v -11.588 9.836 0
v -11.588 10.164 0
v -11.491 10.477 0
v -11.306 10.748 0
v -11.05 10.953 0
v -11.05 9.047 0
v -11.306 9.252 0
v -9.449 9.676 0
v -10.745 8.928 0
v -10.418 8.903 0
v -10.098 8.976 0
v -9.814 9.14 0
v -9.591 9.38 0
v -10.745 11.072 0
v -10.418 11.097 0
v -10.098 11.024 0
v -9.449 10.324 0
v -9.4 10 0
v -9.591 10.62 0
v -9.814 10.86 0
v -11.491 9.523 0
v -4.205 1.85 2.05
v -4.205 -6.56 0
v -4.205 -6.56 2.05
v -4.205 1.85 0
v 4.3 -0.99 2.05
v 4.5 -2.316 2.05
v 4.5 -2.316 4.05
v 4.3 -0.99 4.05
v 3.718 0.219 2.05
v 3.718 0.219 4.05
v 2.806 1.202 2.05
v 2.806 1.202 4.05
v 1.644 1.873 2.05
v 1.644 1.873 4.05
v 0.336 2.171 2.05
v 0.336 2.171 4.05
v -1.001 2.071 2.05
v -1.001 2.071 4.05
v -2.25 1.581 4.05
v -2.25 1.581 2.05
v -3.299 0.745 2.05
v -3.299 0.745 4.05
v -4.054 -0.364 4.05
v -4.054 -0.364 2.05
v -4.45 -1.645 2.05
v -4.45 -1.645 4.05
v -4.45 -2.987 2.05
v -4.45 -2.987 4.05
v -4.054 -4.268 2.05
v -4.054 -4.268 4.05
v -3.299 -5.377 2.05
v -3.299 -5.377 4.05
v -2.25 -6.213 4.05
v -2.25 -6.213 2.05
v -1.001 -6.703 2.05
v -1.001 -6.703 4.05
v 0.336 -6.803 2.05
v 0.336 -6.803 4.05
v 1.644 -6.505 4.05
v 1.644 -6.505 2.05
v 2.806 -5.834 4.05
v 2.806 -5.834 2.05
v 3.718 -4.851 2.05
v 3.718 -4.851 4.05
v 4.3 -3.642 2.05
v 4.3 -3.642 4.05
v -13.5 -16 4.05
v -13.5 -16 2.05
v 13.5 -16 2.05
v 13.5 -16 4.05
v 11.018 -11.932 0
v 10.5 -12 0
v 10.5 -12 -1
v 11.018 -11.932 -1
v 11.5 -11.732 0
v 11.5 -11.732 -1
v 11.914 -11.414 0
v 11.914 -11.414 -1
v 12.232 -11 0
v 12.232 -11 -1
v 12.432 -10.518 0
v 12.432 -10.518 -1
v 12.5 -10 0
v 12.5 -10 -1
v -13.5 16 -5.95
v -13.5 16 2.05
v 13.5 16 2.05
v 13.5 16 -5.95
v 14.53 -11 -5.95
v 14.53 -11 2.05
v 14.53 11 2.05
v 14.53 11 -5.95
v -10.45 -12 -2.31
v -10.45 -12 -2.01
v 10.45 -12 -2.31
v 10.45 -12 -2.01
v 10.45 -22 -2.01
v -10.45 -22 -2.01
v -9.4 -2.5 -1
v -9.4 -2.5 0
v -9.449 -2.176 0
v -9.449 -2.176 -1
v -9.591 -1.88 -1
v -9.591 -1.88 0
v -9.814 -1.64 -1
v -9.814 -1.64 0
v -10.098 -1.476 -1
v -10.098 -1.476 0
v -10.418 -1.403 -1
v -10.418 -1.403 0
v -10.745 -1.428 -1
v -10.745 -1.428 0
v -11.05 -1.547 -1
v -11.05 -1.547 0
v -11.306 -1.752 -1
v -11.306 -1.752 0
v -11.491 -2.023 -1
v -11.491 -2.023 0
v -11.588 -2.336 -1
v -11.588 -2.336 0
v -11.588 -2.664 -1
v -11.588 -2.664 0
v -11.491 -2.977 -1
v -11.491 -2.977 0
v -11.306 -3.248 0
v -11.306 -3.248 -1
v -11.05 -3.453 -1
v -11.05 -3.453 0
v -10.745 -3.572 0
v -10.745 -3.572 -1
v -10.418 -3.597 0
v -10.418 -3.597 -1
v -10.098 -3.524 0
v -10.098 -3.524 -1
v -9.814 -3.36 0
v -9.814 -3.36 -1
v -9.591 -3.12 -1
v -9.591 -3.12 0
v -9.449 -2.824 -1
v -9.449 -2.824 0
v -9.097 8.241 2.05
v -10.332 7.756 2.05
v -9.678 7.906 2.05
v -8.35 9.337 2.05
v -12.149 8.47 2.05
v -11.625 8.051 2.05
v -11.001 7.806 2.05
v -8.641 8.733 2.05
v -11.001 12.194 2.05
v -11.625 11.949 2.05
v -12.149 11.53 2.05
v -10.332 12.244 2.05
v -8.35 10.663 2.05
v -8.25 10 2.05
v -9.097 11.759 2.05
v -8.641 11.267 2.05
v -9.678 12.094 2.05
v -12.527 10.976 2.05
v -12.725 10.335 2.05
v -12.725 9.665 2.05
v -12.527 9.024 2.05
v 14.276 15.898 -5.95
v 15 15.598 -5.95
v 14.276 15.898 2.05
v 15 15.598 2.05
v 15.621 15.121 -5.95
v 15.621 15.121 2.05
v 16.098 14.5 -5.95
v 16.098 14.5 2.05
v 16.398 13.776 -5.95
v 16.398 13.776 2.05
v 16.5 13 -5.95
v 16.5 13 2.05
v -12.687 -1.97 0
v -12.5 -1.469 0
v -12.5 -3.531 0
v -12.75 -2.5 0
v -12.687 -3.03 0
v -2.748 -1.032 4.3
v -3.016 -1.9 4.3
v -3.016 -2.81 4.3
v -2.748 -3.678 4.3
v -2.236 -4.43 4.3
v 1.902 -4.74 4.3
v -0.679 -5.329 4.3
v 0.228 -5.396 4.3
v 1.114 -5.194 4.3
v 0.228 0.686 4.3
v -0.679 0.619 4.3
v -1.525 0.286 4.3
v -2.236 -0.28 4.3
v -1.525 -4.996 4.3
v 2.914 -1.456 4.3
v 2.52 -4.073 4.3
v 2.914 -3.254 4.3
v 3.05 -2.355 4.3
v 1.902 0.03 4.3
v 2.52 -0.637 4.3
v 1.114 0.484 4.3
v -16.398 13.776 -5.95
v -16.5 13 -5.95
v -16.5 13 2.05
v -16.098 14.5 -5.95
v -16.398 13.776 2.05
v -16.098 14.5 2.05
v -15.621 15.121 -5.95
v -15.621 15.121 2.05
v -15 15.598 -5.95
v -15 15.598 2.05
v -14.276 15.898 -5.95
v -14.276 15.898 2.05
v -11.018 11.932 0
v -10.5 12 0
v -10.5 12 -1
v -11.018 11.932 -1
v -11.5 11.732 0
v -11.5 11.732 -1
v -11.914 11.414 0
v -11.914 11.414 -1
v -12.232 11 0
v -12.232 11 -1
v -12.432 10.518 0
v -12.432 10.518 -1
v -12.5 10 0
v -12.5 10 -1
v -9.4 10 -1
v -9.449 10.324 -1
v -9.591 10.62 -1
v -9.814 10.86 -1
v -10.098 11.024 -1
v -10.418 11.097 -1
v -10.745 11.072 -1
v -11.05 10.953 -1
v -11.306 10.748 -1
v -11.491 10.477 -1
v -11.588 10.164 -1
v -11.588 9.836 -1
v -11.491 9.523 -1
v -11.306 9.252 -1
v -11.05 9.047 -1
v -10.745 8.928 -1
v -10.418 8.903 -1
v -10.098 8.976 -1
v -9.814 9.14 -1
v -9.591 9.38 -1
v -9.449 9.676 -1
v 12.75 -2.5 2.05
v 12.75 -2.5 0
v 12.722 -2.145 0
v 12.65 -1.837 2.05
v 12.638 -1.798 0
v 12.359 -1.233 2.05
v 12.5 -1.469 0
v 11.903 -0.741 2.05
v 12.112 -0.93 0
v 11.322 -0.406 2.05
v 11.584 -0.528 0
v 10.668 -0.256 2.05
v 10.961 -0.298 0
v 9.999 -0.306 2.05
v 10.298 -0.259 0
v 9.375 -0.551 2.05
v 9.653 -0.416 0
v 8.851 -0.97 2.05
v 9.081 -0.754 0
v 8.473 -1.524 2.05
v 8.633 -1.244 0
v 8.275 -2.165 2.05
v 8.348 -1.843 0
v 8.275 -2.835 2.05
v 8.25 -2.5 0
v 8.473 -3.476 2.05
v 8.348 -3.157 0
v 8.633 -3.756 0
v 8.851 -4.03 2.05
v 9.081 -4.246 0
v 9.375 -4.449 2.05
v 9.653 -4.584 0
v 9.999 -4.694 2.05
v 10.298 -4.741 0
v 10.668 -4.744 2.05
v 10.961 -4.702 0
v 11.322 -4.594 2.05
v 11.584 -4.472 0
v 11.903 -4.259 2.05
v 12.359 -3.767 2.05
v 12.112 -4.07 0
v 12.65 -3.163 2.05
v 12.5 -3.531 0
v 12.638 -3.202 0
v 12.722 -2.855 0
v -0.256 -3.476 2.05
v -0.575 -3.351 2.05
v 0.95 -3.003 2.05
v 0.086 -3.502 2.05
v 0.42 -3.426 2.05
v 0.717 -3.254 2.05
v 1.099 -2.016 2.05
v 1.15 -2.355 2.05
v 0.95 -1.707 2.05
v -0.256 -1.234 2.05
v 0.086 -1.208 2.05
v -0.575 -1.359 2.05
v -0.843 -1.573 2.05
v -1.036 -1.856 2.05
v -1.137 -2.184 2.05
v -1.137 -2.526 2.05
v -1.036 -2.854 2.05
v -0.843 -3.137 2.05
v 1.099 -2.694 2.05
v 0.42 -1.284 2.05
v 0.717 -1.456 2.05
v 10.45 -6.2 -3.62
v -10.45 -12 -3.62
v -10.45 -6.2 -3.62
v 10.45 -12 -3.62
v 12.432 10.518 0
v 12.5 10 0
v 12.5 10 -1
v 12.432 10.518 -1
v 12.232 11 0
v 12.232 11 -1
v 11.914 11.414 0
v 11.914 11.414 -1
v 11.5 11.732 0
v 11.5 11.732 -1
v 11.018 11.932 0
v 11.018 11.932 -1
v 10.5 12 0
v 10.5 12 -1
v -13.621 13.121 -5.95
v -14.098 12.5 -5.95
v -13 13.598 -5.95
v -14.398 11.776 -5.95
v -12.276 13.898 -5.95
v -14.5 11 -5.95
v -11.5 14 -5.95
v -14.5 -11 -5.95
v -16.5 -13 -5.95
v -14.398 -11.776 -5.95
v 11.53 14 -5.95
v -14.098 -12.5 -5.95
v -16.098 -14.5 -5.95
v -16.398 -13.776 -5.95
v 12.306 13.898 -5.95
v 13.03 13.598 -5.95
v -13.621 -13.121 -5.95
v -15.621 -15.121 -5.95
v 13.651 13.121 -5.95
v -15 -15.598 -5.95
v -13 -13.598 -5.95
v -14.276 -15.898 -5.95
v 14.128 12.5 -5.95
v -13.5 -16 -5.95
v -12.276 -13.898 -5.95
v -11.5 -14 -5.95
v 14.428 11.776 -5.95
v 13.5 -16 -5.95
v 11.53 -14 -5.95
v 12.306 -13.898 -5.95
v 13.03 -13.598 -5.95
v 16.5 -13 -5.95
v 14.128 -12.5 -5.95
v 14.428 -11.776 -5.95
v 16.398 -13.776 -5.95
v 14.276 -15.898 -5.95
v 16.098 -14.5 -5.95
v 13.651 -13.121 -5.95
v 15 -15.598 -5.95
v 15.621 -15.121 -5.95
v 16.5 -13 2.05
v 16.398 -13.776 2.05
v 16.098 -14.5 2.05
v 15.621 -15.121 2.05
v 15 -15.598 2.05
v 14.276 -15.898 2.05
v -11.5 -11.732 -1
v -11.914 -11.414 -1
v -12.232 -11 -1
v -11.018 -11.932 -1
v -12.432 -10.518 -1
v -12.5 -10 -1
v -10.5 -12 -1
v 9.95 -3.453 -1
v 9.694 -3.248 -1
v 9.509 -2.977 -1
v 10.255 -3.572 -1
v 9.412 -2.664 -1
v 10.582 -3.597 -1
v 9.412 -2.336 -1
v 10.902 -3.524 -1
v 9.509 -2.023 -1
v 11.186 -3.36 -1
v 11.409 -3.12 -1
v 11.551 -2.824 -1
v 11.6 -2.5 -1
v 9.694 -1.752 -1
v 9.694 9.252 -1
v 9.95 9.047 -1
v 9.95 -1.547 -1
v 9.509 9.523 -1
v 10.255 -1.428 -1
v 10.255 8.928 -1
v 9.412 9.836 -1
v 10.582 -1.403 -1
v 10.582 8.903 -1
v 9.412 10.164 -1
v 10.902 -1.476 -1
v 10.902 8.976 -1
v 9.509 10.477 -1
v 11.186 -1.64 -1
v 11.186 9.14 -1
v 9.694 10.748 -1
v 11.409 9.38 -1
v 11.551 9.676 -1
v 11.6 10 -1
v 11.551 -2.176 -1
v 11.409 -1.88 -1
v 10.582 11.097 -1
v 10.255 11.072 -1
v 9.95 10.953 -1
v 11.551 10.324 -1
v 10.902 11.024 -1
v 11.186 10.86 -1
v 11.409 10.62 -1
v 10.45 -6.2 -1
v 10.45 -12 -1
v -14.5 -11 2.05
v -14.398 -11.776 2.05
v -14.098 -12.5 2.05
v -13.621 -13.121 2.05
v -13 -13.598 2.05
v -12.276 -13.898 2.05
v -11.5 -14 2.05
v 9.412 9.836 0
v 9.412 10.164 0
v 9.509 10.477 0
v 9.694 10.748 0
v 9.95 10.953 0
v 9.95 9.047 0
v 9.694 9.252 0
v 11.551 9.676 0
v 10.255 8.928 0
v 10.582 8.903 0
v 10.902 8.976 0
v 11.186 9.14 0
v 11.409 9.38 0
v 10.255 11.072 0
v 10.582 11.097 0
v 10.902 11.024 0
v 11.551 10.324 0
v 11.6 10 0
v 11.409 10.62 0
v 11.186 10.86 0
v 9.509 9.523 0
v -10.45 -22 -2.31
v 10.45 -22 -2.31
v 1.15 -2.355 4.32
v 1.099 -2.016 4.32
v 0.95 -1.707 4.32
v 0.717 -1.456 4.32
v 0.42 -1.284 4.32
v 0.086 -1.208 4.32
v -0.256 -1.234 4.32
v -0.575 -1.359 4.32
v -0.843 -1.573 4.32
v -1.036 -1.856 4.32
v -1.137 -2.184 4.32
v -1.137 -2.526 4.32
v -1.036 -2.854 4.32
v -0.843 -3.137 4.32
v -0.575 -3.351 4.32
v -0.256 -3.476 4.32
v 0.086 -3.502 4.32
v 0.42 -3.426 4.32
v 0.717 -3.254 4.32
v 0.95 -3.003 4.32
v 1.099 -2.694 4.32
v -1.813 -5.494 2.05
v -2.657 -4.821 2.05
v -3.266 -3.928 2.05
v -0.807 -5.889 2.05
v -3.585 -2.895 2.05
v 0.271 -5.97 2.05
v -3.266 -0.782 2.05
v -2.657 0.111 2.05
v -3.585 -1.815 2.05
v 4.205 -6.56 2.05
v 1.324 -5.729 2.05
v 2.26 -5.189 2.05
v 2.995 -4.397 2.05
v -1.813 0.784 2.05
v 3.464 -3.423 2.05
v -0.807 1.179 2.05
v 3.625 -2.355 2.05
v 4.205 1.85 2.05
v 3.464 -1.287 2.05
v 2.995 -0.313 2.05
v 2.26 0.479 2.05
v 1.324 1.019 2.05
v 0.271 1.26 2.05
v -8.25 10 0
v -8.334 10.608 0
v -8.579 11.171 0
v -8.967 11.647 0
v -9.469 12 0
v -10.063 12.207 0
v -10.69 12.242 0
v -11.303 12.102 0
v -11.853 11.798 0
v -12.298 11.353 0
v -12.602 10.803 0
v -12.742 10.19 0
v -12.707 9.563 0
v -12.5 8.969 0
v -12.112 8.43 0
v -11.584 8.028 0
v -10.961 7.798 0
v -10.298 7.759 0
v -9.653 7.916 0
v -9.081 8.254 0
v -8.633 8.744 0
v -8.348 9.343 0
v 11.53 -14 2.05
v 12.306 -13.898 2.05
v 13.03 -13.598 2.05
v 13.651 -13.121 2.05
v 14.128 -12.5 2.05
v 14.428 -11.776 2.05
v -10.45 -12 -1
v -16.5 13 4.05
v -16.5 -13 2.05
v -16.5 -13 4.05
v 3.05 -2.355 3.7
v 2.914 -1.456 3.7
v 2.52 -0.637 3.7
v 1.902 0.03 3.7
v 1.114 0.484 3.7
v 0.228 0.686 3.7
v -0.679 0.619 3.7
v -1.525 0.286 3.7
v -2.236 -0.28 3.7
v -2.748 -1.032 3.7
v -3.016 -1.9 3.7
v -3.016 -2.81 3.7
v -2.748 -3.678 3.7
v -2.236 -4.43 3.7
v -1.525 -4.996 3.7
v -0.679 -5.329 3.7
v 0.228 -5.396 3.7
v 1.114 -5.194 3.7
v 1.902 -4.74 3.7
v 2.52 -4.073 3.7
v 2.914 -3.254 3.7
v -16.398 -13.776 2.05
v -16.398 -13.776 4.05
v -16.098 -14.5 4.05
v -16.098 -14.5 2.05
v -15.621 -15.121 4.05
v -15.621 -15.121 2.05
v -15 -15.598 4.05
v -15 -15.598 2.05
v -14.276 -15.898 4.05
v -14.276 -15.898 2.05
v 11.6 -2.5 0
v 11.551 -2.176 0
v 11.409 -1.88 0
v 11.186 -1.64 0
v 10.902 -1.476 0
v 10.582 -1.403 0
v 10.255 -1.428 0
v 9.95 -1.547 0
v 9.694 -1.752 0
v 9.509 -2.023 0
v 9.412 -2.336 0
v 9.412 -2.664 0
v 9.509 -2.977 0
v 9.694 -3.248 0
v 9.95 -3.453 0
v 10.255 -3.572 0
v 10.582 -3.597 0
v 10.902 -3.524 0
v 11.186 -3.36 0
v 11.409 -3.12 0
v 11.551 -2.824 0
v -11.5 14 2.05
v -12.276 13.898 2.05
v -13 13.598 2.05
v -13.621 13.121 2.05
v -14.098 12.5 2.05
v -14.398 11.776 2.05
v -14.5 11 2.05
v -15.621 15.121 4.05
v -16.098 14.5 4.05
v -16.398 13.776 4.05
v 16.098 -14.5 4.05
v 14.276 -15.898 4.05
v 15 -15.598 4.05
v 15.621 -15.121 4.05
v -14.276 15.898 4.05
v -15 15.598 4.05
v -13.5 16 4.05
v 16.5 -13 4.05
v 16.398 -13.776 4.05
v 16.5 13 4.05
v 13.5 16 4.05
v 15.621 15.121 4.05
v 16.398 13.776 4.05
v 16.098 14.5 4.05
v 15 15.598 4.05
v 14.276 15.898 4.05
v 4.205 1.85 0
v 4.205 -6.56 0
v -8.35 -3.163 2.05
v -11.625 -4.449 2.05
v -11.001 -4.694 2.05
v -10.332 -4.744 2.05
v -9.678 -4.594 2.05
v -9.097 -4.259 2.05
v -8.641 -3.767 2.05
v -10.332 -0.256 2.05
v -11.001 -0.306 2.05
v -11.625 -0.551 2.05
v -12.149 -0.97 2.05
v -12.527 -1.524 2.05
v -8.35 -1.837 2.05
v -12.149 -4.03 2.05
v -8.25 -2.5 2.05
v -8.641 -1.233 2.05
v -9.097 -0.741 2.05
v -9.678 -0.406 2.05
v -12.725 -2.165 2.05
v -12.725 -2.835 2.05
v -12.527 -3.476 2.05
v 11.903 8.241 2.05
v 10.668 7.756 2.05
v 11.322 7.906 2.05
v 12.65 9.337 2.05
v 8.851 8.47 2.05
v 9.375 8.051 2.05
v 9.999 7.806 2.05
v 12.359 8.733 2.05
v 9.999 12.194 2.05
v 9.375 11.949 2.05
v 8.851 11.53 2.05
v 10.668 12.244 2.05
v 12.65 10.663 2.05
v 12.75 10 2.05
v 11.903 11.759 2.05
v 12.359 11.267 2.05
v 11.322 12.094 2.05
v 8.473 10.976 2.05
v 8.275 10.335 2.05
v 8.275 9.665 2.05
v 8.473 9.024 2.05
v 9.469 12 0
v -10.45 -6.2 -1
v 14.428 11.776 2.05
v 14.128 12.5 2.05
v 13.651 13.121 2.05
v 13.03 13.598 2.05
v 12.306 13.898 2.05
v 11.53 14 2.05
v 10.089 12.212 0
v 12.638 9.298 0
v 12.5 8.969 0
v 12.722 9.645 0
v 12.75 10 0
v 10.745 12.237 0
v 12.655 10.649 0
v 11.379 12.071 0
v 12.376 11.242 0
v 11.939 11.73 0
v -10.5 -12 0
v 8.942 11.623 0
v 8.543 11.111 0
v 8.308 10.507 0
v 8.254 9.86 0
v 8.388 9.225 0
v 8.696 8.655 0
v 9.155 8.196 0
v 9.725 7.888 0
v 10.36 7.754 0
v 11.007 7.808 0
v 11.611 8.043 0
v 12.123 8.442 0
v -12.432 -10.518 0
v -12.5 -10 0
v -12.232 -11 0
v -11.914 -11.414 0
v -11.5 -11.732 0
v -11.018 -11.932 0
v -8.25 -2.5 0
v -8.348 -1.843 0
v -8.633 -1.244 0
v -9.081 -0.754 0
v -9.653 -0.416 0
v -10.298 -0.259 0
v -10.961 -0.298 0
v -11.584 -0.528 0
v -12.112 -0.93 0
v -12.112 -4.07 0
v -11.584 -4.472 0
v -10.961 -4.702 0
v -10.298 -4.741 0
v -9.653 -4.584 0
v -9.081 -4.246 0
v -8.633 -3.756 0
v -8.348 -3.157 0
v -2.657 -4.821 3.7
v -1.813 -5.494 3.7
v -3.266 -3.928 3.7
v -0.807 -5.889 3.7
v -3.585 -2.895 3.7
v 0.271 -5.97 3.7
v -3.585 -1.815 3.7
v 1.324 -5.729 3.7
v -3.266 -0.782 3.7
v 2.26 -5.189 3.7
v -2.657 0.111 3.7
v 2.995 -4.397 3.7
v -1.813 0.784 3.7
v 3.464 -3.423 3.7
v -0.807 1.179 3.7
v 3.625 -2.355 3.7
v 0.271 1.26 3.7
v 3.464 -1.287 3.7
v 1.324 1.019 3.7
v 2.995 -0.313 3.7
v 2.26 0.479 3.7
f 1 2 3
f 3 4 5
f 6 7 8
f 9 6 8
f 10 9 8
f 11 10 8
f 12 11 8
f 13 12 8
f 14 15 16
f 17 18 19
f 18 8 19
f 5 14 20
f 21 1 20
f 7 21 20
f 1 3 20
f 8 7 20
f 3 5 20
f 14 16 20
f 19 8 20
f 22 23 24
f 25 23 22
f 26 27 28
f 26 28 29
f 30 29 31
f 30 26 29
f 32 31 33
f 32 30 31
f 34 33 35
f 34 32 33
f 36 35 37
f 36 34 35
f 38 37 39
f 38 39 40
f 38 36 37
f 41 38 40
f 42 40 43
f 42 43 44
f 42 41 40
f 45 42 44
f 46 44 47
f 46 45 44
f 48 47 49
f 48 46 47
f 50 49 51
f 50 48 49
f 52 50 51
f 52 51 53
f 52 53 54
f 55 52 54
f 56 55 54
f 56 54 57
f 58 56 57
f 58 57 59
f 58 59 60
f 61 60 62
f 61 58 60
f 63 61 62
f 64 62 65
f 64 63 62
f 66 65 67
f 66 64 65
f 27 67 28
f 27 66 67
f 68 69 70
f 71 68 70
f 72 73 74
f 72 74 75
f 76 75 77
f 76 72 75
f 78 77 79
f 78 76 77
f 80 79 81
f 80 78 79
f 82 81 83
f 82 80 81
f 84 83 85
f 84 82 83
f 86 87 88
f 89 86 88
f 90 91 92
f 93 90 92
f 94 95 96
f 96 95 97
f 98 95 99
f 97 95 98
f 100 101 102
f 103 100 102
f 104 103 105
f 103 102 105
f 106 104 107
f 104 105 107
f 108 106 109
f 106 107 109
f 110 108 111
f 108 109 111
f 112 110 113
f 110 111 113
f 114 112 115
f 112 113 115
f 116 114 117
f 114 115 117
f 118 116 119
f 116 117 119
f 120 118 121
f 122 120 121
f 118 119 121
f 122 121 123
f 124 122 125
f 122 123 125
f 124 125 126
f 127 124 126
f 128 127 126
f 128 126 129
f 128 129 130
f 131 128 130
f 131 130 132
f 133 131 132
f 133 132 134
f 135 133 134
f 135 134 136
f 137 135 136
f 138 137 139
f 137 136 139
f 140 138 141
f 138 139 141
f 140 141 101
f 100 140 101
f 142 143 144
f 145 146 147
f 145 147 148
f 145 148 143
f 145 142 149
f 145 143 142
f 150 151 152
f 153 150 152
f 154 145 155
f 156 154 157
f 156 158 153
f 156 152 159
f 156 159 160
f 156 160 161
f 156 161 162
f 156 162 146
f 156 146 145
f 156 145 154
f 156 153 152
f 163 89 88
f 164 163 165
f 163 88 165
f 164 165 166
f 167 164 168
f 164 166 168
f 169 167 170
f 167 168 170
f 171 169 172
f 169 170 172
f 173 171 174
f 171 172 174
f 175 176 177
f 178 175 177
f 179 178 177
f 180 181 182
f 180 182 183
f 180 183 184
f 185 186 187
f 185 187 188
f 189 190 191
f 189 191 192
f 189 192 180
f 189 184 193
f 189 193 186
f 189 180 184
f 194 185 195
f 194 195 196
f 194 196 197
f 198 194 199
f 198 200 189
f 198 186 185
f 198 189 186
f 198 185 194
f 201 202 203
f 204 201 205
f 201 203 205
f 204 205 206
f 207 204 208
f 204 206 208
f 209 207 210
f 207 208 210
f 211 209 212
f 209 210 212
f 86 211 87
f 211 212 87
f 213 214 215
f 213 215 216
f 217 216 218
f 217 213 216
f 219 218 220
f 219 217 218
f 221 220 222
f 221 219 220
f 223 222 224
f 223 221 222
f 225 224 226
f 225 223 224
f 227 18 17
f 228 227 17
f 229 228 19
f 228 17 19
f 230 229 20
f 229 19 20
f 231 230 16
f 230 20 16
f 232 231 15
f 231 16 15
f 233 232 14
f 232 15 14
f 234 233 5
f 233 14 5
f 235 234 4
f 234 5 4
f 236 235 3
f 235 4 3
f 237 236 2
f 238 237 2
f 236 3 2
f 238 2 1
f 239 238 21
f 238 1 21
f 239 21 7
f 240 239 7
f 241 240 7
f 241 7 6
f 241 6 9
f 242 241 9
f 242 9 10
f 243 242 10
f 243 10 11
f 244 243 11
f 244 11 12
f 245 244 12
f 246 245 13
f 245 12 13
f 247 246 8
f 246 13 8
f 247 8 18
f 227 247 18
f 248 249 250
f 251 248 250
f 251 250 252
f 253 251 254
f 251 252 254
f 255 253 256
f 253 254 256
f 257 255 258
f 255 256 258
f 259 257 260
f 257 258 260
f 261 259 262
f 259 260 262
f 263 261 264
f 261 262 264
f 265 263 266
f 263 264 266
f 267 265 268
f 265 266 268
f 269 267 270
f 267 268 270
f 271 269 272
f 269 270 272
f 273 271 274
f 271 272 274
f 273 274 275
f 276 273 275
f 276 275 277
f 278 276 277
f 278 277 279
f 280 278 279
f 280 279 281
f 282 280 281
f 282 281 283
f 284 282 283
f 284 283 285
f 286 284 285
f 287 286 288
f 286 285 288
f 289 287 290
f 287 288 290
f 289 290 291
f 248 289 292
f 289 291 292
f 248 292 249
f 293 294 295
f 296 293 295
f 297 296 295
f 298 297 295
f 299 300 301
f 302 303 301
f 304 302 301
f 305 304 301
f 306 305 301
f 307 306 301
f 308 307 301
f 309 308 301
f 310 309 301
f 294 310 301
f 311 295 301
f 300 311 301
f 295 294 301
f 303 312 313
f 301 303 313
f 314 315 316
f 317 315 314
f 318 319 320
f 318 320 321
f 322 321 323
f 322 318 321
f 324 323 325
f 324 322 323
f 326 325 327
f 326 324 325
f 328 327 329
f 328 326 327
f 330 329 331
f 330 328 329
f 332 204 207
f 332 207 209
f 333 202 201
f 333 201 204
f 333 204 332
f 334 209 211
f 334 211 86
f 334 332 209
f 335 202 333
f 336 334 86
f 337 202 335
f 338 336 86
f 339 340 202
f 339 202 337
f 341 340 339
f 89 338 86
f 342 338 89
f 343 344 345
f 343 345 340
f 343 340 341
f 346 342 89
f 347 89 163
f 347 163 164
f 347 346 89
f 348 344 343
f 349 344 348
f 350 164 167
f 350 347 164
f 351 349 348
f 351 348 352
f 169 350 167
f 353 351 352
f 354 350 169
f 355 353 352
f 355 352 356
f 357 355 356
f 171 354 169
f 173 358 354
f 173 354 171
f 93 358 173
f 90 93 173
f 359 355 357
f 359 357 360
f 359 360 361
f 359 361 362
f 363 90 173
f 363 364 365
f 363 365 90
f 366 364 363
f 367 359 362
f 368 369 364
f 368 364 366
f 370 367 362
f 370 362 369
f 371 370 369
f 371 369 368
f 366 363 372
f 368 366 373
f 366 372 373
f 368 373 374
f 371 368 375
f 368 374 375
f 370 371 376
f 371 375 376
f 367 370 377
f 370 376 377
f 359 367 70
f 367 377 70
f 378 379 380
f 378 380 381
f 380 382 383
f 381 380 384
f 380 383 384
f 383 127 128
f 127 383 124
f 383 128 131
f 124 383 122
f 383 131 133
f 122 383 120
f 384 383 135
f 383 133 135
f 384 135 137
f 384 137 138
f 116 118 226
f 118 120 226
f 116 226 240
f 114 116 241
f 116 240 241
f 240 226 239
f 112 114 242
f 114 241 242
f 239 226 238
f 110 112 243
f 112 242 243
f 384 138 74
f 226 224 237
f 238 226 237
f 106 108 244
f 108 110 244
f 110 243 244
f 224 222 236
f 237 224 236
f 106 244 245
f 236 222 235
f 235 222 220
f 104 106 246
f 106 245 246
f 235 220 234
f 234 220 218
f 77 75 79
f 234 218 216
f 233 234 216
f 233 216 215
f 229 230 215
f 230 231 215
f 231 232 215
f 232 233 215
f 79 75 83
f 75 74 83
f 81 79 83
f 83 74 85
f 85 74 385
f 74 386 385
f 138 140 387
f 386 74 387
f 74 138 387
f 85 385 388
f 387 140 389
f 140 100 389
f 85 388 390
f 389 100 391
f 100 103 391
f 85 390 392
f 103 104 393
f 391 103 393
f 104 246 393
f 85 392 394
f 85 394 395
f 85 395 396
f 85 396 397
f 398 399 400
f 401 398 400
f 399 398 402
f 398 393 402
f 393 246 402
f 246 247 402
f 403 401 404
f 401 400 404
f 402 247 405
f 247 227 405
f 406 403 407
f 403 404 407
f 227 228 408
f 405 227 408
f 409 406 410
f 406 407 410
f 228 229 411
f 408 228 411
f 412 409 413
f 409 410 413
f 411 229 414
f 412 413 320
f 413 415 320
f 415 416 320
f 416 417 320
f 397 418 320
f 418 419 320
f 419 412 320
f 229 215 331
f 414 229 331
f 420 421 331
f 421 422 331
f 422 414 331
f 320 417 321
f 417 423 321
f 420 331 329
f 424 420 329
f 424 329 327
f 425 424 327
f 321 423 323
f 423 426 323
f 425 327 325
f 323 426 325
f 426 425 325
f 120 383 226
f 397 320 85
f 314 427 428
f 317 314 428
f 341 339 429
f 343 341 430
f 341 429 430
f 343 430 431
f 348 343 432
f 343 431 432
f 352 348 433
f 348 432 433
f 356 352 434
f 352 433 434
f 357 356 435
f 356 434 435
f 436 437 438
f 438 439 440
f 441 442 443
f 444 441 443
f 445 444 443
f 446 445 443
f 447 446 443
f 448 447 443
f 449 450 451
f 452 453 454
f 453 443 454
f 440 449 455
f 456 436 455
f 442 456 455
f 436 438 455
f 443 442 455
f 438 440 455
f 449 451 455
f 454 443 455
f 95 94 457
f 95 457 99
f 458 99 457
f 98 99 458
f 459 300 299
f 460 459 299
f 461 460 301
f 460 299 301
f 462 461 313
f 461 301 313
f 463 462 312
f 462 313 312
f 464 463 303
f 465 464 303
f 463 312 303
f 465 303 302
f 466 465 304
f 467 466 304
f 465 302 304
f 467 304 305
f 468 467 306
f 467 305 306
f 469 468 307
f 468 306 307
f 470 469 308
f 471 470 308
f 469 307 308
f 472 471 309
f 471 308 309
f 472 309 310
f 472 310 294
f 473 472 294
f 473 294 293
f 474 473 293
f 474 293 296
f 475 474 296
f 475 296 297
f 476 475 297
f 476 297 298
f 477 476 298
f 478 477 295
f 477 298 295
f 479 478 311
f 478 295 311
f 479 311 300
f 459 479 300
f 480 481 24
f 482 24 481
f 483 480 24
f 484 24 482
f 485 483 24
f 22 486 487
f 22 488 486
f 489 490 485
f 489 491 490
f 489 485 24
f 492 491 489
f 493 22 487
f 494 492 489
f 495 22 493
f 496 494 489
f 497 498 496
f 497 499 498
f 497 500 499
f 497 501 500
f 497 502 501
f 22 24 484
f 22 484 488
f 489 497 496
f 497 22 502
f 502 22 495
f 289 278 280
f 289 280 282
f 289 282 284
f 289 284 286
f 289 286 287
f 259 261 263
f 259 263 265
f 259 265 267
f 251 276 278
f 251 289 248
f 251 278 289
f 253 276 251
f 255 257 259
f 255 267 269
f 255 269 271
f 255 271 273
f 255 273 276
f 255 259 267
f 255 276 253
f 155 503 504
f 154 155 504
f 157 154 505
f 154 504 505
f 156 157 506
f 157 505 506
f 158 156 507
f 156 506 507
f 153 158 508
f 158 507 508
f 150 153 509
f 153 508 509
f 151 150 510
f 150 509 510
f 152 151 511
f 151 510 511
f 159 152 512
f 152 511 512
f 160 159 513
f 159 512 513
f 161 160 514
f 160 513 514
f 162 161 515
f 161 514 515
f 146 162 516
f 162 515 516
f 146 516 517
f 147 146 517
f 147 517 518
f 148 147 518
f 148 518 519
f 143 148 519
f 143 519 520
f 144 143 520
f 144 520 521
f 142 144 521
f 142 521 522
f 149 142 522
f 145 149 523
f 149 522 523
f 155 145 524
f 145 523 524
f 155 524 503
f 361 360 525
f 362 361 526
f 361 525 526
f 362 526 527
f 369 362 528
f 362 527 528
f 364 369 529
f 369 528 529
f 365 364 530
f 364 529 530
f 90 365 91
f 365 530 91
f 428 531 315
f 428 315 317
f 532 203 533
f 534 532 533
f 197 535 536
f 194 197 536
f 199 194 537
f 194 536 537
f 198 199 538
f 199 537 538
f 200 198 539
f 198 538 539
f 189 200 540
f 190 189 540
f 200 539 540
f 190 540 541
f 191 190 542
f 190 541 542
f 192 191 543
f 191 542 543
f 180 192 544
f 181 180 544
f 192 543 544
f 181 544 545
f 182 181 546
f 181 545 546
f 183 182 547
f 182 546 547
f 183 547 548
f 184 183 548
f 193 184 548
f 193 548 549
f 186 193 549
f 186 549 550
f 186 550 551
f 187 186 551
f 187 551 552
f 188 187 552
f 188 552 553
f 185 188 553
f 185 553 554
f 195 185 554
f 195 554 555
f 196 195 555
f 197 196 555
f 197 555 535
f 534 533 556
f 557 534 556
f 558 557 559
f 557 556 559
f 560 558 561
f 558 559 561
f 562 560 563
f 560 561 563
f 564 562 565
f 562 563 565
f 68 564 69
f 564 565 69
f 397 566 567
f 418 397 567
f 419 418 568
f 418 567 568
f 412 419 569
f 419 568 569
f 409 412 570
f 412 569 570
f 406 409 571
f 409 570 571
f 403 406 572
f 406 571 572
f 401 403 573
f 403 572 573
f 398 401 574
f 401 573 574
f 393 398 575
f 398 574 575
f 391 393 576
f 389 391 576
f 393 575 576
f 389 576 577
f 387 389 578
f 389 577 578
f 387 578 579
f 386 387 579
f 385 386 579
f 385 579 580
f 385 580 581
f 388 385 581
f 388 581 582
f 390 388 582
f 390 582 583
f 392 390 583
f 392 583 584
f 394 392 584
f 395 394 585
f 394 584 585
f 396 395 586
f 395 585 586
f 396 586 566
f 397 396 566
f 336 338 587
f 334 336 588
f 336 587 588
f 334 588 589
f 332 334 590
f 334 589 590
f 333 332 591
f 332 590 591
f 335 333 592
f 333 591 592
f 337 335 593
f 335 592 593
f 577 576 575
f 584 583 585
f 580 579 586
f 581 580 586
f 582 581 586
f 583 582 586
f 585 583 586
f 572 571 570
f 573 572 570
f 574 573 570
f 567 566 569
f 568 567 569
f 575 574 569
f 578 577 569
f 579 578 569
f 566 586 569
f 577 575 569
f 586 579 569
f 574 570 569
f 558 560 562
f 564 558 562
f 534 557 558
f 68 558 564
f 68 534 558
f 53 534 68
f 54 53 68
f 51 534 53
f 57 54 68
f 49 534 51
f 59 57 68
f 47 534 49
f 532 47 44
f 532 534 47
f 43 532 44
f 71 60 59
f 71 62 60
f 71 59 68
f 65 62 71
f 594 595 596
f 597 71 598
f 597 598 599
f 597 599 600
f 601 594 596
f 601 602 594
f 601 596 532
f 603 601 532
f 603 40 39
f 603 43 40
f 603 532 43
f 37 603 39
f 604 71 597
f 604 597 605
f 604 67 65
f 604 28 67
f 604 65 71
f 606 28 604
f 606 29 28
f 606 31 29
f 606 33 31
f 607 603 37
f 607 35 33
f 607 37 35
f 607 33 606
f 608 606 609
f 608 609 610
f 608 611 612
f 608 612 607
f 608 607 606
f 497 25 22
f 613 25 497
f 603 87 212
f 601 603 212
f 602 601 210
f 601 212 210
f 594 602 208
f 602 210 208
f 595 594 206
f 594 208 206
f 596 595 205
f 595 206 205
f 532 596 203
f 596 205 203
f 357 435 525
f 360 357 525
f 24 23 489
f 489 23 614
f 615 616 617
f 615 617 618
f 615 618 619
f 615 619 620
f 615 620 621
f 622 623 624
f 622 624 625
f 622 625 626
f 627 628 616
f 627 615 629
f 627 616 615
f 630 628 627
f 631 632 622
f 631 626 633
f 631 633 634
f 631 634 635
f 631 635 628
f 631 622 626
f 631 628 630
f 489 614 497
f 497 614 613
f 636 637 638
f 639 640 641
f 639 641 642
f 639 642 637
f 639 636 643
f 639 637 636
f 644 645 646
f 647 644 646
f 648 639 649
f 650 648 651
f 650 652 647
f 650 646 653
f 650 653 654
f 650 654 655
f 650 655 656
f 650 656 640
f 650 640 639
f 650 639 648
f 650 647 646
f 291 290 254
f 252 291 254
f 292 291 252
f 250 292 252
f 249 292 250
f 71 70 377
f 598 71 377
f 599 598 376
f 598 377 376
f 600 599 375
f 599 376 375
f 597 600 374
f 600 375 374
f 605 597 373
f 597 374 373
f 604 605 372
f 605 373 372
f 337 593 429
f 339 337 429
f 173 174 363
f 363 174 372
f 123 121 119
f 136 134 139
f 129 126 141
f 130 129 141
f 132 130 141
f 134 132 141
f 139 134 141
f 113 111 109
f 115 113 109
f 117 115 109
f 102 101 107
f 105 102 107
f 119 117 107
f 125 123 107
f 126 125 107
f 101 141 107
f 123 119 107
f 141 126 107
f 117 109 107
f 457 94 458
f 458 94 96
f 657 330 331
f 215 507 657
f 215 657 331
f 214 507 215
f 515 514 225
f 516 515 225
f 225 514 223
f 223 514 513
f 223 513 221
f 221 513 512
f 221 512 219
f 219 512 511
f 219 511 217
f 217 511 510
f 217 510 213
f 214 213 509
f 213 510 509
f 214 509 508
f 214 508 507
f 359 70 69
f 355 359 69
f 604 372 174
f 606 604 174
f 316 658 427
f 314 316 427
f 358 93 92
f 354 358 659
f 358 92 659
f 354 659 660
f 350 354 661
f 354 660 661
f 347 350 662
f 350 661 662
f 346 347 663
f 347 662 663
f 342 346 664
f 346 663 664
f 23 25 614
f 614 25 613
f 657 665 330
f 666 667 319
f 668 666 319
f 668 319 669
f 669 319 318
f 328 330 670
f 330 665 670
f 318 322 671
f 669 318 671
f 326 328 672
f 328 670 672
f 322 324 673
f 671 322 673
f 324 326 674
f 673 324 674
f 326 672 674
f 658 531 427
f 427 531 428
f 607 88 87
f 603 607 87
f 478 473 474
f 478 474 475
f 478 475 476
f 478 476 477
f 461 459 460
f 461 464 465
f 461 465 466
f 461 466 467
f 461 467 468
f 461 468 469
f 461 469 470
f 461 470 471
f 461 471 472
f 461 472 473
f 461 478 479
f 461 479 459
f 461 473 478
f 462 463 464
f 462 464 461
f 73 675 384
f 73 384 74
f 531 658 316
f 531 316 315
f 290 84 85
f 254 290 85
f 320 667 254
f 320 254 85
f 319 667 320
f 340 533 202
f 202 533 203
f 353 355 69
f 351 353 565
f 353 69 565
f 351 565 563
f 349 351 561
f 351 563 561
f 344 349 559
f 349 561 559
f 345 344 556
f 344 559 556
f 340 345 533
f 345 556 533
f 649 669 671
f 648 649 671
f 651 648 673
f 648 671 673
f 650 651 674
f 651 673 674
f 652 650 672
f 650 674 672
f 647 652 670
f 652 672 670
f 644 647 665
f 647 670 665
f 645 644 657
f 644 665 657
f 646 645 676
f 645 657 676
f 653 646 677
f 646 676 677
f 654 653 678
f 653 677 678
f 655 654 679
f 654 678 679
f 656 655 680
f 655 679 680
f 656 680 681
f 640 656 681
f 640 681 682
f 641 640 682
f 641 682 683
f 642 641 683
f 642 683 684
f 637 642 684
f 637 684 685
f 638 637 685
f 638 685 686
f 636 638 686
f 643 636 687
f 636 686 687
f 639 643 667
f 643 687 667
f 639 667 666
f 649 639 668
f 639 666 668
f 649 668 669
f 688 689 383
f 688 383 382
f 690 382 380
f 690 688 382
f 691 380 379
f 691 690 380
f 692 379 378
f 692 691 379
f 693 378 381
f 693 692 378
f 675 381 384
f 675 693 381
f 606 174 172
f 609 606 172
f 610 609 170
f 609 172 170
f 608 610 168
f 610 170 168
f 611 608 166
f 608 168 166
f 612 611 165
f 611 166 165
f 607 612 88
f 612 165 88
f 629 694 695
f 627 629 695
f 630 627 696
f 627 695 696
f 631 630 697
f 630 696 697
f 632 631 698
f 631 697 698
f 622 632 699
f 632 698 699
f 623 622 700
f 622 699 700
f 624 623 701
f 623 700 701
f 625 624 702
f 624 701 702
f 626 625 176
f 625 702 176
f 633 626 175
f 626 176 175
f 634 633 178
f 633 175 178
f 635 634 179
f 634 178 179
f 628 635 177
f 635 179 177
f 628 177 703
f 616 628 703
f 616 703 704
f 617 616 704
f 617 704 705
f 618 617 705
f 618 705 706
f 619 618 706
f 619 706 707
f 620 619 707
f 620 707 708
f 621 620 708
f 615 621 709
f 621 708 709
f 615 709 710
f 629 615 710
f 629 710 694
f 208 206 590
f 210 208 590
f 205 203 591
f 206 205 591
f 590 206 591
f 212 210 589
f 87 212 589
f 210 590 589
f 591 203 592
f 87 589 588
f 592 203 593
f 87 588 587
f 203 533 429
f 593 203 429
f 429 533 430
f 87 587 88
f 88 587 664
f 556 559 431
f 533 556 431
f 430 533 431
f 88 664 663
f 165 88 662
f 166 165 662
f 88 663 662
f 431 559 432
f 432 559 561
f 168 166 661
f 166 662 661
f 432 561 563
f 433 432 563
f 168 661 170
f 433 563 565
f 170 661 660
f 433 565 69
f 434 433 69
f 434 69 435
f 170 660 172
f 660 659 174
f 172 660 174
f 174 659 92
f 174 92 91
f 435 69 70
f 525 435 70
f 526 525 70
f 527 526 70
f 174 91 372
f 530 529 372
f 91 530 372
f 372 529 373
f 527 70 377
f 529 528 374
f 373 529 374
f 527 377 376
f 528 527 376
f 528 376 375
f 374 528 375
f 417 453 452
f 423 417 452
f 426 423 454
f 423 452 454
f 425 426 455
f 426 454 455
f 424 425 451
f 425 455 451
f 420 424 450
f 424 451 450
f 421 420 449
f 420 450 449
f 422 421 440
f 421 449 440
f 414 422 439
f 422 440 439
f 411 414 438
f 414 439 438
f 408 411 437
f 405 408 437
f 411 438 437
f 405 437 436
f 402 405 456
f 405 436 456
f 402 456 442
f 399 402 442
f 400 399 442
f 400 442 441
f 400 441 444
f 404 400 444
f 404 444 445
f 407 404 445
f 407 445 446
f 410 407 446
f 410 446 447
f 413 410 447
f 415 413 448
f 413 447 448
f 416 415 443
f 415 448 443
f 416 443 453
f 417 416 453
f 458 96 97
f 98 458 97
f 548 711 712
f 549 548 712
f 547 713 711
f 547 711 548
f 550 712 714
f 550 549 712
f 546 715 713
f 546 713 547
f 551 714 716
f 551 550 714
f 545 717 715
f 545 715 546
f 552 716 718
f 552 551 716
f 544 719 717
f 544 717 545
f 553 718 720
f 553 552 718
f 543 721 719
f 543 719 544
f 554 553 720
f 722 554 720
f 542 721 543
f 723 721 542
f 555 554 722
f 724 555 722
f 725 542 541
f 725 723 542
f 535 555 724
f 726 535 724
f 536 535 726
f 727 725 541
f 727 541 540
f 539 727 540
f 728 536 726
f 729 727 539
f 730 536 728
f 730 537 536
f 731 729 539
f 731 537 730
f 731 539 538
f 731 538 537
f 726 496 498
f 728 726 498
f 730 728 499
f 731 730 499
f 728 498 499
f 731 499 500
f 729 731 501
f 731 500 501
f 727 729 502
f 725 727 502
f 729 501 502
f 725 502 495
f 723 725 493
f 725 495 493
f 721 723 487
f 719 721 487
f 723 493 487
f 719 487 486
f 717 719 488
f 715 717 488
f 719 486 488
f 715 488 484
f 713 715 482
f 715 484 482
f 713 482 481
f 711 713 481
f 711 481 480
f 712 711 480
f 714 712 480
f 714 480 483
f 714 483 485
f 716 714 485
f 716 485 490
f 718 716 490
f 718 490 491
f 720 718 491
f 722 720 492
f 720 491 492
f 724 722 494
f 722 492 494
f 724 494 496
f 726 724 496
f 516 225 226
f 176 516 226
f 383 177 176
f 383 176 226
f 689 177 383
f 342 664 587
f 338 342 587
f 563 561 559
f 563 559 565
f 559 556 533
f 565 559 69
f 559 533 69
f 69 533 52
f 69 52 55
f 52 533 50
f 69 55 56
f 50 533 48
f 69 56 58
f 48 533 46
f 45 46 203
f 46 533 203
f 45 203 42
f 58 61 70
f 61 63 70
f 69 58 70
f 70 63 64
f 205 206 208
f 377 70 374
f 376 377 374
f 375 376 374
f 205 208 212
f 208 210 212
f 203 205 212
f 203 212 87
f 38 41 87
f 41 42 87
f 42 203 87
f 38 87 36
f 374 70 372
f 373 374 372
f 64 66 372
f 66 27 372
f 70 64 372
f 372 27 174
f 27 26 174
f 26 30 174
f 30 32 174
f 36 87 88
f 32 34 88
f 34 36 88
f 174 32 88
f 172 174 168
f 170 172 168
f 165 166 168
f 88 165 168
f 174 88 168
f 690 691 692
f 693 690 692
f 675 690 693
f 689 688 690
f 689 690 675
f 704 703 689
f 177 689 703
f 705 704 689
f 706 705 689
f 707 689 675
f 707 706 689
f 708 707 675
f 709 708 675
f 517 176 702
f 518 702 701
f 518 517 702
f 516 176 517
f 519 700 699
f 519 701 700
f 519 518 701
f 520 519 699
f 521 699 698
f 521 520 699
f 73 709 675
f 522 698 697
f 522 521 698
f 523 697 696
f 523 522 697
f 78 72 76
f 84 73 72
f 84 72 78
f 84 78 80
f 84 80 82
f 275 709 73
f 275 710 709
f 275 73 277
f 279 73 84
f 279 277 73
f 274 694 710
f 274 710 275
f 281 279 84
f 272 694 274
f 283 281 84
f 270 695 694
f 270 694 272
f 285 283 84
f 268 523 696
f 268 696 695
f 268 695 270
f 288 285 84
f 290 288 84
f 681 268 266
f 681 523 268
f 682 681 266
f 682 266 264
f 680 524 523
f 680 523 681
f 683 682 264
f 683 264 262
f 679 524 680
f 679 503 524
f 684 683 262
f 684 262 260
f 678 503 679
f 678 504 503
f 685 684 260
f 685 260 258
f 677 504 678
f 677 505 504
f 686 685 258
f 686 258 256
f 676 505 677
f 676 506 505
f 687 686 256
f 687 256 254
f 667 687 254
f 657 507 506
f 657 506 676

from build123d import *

# Parameters (mm, degrees)
F1_DEPTH  = 1
F2_R      = 1.1
F3_DEPTH  = 1
F4_W      = 8.41
F4_H      = 8.41
F5_DEPTH  = 2.05
F6_R      = 3.625
F6_R_2    = 3.05
F6_R_3    = 1.15
F7_DEPTH  = 1.65
F8_DEPTH  = 2.25
F9_DEPTH  = 2.27
F10_W     = 20.9
F10_H     = 5.8
F11_DEPTH = 2.62
F12_W     = 20.9
F12_H     = 0.3
F13_DEPTH = 10
F14_R     = 2.25
F15_DEPTH = 2.05
F16_R     = 4.5
F17_DEPTH = 2
F19_DEPTH = 8


with BuildPart() as f1:
    # F0 (on Top) → F1 (new body)
    with BuildSketch(Plane.XY):
        with BuildLine():
            ThreePointArc((12.5, 10), (11.914214, 11.414214), (10.5, 12))
            Line((10.5, 12), (-10.5, 12))
            ThreePointArc((-10.5, 12), (-11.914214, 11.414214), (-12.5, 10))
            Line((-12.5, 10), (-12.5, -10))
            ThreePointArc((-12.5, -10), (-11.914214, -11.414214), (-10.5, -12))
            Line((-10.5, -12), (10.5, -12))
            ThreePointArc((10.5, -12), (11.914214, -11.414214), (12.5, -10))
            Line((12.5, -10), (12.5, 10))
        make_face()
    extrude(amount=-F1_DEPTH)

    # F2 (on face) → F3 (cut, through all)
    with BuildSketch(Plane.XY):
        with Locations((-10.5, 10)):
            Circle(F2_R)
        with Locations((-10.5, -2.5)):
            Circle(F2_R)
        with Locations((10.5, -2.5)):
            Circle(F2_R)
        with Locations((10.5, 10)):
            Circle(F2_R)
    extrude(amount=-F3_DEPTH, mode=Mode.SUBTRACT)

    # F14 (on face) → F15 (join, through all)
    with BuildSketch(Plane.XY):
        with Locations((-10.5, 10)):
            Circle(F14_R)
        with Locations((10.5, 10)):
            Circle(F14_R)
        with Locations((10.5, -2.5)):
            Circle(F14_R)
        with Locations((-10.5, -2.5)):
            Circle(F14_R)
    extrude(amount=F15_DEPTH)


with BuildPart() as f5:
    # F4 (on face) → F5 (new body)
    with BuildSketch(Plane.XY):
        with Locations((0, -2.355)):
            Rectangle(F4_W, F4_H)
    extrude(amount=F5_DEPTH)

    # F6 (on face) → F7 (join)
    with BuildSketch(Plane.XY.offset(2.05)):
        with Locations((0, -2.355)):
            Circle(F6_R)
        with Locations((0, -2.355)):
            Circle(F6_R_2, mode=Mode.SUBTRACT)
        with Locations((0, -2.355)):
            Circle(F6_R_2)
        with Locations((0, -2.355)):
            Circle(F6_R_3, mode=Mode.SUBTRACT)
        with Locations((0, -2.355)):
            Circle(F6_R_3)
    extrude(amount=F7_DEPTH)

    # F6 (on face) → F8 (join)
    with BuildSketch(Plane.XY.offset(2.05)):
        with Locations((0, -2.355)):
            Circle(F6_R_2)
        with Locations((0, -2.355)):
            Circle(F6_R_3, mode=Mode.SUBTRACT)
        with Locations((0, -2.355)):
            Circle(F6_R_3)
    extrude(amount=F8_DEPTH)


with BuildPart() as f9:
    # F6 (on face) → F9 (new body)
    with BuildSketch(Plane.XY.offset(2.05)):
        with Locations((0, -2.355)):
            Circle(F6_R_3)
    extrude(amount=F9_DEPTH)


with BuildPart() as f11:
    # F10 (on face) → F11 (new body)
    with BuildSketch(Plane(origin=(0, 0, -1), x_dir=(1, 0, 0), z_dir=(0, 0, -1))):
        with Locations((0, 9.1)):
            Rectangle(F10_W, F10_H)
    extrude(amount=F11_DEPTH)


with BuildPart() as f13:
    # F12 (on face) → F13 (new body)
    with BuildSketch(Plane.XZ.offset(12)):
        with Locations((0, -2.16)):
            Rectangle(F12_W, F12_H)
    extrude(amount=F13_DEPTH)


with BuildPart() as f17:
    # F16 (on face) → F17 (new body)
    with BuildSketch(Plane.XY.offset(2.05)):
        with BuildLine():
            ThreePointArc((16.5, 13), (15.62132, 15.12132), (13.5, 16))
            Line((13.5, 16), (-13.5, 16))
            ThreePointArc((-13.5, 16), (-15.62132, 15.12132), (-16.5, 13))
            Line((-16.5, 13), (-16.5, -13))
            ThreePointArc((-16.5, -13), (-15.62132, -15.12132), (-13.5, -16))
            Line((-13.5, -16), (13.5, -16))
            ThreePointArc((13.5, -16), (15.62132, -15.12132), (16.5, -13))
            Line((16.5, -13), (16.5, 13))
        make_face()
        with Locations((0, -2.315999)):
            Circle(F16_R, mode=Mode.SUBTRACT)
    extrude(amount=F17_DEPTH)


with BuildPart() as f19:
    # F18 (on face) → F19 (new body)
    with BuildSketch(Plane(origin=(0, 0, 2.05), x_dir=(1, 0, 0), z_dir=(0, 0, -1))):
        with BuildLine():
            ThreePointArc((-16.5, -13), (-15.62132, -15.12132), (-13.5, -16))
            Line((-13.5, -16), (13.5, -16))
            ThreePointArc((13.5, -16), (15.62132, -15.12132), (16.5, -13))
            Line((16.5, -13), (16.5, 13))
            ThreePointArc((16.5, 13), (15.62132, 15.12132), (13.5, 16))
            Line((13.5, 16), (-13.5, 16))
            ThreePointArc((-13.5, 16), (-15.62132, 15.12132), (-16.5, 13))
            Line((-16.5, 13), (-16.5, -13))
        make_face()
        with BuildLine():
            Line((11.53, -14), (-11.5, -14))
            ThreePointArc((-11.5, -14), (-13.62132, -13.12132), (-14.5, -11))
            Line((-14.5, -11), (-14.5, 11))
            ThreePointArc((-14.5, 11), (-13.62132, 13.12132), (-11.5, 14))
            Line((-11.5, 14), (11.53, 14))
            ThreePointArc((11.53, 14), (13.65132, 13.12132), (14.53, 11))
            Line((14.53, 11), (14.53, -11))
            ThreePointArc((14.53, -11), (13.65132, -13.12132), (11.53, -14))
        make_face(mode=Mode.SUBTRACT)
    extrude(amount=F19_DEPTH)


solid = Compound([f1.part, f5.part, f9.part, f11.part, f13.part, f17.part, f19.part])
